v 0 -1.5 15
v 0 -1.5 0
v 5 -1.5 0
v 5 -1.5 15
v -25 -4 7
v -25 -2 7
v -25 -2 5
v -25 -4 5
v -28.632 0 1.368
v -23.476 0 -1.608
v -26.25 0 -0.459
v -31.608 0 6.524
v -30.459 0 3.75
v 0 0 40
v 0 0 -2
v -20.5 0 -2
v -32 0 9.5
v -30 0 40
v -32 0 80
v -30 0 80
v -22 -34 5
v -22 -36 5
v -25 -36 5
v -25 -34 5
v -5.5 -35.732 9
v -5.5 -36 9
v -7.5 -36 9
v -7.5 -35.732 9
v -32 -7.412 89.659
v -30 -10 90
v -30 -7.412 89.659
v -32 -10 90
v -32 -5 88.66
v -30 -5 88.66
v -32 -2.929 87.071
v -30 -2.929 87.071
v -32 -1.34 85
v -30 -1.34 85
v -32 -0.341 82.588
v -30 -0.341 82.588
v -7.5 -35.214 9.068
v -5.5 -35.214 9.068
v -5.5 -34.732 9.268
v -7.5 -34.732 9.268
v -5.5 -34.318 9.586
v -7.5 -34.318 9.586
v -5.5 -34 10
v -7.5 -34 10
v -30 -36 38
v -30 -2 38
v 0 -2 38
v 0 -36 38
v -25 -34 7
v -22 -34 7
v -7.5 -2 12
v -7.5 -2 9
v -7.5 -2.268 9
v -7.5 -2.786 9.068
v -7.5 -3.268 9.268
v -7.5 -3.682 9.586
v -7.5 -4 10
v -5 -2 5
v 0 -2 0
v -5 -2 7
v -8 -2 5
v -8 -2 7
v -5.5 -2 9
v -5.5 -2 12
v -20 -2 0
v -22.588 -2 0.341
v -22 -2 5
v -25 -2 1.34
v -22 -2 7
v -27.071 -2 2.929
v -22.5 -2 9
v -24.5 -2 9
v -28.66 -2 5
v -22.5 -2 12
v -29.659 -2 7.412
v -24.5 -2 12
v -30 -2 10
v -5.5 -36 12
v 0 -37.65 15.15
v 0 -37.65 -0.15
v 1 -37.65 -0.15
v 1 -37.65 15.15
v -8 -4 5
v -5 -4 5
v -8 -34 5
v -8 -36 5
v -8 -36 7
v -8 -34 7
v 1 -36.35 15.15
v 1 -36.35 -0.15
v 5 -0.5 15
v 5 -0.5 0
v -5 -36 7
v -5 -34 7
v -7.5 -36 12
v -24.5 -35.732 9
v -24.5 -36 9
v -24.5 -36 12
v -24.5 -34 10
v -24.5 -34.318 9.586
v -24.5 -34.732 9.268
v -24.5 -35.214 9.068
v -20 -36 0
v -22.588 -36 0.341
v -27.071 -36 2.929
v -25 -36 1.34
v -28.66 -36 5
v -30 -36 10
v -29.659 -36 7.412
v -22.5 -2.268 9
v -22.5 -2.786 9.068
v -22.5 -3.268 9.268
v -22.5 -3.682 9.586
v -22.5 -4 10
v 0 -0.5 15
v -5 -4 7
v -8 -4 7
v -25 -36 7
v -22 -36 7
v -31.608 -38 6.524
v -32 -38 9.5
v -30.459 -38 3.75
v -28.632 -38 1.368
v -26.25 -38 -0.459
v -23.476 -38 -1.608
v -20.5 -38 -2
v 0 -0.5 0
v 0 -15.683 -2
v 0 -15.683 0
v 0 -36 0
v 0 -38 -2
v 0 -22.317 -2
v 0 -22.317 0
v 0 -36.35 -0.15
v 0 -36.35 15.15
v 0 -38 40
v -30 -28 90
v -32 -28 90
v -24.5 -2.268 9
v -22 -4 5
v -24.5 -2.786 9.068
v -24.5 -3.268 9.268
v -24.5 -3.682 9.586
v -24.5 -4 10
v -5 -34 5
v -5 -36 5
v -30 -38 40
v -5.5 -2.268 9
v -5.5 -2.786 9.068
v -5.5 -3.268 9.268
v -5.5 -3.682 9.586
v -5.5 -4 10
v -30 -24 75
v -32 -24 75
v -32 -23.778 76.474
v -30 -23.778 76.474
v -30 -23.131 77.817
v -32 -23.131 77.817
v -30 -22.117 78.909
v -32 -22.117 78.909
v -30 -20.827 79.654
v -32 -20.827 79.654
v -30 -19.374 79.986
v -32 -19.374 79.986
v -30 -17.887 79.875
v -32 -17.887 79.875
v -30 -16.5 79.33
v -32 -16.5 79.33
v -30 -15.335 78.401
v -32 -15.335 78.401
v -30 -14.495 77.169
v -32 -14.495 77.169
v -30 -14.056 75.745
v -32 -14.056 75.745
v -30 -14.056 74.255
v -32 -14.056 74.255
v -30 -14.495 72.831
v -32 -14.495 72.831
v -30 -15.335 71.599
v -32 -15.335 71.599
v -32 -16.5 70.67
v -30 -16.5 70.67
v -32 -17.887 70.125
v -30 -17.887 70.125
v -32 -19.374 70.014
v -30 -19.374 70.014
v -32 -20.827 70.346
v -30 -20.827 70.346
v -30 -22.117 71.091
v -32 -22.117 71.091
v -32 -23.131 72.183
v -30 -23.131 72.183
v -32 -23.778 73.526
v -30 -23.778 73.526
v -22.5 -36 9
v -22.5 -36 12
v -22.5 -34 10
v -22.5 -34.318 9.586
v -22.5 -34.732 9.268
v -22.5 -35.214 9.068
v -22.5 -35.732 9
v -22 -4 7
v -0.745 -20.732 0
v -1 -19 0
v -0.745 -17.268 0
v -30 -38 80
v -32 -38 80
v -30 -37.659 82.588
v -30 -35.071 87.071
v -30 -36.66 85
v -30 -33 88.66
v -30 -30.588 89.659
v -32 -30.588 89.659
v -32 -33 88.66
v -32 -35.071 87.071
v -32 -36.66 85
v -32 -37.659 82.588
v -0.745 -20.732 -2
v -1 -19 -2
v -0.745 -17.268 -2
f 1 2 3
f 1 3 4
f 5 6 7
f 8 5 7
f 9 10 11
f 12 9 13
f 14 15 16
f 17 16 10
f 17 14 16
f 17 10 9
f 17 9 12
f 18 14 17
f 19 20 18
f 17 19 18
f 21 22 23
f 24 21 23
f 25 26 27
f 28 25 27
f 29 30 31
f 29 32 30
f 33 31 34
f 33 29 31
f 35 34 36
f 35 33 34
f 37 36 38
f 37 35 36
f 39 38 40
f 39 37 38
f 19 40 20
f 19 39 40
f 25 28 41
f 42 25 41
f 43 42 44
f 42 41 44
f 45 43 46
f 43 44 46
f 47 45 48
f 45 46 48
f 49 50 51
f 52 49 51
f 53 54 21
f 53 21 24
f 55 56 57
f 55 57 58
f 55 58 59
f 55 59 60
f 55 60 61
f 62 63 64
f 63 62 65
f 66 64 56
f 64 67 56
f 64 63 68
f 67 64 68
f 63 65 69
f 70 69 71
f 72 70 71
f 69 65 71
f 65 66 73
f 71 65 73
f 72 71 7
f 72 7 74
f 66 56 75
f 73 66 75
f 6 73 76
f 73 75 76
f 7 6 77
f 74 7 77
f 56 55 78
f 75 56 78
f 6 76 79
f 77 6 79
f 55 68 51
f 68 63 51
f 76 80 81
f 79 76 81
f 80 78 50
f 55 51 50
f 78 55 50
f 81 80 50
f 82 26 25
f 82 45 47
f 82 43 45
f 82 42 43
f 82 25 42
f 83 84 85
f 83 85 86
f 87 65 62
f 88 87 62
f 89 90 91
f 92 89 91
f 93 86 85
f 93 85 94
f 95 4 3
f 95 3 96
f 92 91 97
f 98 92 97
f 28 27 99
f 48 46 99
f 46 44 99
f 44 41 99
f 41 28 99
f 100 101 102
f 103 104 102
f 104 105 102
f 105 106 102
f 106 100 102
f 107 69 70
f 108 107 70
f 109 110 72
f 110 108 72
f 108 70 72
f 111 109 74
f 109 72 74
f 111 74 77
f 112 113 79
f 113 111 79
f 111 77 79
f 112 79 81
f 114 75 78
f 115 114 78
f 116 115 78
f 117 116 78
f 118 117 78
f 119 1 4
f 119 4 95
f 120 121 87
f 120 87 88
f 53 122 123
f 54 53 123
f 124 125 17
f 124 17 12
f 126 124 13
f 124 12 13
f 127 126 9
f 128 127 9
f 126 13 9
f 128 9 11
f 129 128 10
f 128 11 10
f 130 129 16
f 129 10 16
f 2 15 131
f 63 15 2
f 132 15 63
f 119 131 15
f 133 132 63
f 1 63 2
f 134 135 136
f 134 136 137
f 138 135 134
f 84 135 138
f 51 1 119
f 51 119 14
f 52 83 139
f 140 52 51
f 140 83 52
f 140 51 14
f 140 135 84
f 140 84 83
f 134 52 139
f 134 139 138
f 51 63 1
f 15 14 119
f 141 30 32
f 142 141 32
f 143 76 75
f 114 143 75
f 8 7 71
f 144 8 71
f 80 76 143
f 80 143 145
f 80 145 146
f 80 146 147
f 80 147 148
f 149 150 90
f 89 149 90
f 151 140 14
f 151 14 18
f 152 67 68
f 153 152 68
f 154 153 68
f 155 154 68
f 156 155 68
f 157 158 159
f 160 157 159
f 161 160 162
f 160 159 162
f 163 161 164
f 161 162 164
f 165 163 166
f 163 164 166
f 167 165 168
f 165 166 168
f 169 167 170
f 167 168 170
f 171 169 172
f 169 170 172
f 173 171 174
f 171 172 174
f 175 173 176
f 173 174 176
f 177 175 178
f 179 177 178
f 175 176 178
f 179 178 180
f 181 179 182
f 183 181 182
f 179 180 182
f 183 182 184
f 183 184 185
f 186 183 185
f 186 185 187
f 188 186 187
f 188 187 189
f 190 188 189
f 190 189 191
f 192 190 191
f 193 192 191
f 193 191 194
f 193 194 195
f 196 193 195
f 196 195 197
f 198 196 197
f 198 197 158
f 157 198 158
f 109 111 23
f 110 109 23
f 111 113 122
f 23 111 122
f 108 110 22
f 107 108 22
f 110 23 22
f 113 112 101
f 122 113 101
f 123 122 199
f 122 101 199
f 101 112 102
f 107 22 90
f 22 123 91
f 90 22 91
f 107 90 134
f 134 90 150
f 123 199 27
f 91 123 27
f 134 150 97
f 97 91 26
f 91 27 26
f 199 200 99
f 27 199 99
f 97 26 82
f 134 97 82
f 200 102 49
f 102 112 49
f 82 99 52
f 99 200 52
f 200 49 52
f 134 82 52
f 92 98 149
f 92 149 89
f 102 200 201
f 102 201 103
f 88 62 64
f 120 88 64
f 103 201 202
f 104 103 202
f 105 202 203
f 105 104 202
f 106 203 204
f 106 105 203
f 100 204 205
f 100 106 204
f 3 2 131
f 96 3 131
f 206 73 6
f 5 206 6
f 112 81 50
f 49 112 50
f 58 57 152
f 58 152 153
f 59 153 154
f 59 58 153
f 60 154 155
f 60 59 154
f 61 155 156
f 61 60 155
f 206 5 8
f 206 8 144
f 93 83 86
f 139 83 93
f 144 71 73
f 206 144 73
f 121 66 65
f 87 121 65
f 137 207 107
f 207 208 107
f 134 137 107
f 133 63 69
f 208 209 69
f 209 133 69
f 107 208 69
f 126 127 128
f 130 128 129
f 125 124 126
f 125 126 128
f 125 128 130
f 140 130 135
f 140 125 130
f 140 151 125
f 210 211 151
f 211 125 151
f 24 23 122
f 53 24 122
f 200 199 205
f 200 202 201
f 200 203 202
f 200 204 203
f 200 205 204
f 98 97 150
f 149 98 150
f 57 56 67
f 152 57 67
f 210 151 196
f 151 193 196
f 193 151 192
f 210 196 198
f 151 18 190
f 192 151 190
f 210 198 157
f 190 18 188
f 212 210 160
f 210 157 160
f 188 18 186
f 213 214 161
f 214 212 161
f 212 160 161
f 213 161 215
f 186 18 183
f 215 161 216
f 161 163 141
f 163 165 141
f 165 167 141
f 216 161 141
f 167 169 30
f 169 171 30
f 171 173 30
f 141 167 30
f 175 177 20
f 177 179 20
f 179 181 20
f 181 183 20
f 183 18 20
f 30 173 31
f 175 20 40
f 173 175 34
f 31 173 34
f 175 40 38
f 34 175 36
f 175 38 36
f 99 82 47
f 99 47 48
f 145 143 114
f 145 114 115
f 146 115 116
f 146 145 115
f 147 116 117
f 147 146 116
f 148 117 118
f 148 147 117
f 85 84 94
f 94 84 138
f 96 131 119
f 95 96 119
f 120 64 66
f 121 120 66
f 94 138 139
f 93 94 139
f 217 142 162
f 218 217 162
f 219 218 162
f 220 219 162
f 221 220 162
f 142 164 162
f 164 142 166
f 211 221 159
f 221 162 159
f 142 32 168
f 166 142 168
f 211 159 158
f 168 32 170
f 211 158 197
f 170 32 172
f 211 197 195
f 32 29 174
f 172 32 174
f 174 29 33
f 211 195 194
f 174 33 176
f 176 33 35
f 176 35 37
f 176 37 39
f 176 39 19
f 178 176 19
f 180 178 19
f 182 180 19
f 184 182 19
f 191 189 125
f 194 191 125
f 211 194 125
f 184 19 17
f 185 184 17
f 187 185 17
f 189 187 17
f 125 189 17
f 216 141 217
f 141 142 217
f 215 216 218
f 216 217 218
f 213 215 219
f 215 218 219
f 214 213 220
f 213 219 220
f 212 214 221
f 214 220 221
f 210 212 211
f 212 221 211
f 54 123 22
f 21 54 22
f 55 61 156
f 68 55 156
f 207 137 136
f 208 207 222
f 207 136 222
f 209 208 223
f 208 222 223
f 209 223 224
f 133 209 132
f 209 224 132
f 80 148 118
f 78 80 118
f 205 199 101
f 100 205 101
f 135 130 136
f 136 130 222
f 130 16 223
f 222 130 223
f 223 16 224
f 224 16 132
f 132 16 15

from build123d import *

# Parameters (mm, degrees)
F1_DEPTH     = 38
F3_D         = 12
F4_R         = 10
F6_D         = 10
F8_DEPTH     = 2
F10_DEPTH    = 2
F11_W        = 30
F11_H        = 38
F12_DEPTH    = 2
F14_W        = 1
F14_H        = 15
F15_DEPTH    = 5
F16_W        = 2
F16_H        = 3
F18_DEPTH    = 2
F17_W        = 2
F17_H        = 3
F19_DEPTH    = 2
F20_SIZE     = 1.99999
F21_T1_DEPTH = 10.6602829052
F21_T3_DEPTH = 10.6602829052
F14_W_2      = 1.3
F14_H_2      = 15.3
F22_DEPTH    = 1


# Not quite as in the source:
# - a fillet or chamfer that OpenCascade refuses, or shapes differently, is made with other operations: its cross-section is extruded or revolved along the edge and cut away or added
# - a fillet or chamfer is up to 0.001 mm smaller than in the source, because OpenCascade refuses the exact size
# - a feature names something its author has since deleted; it is built from what else it names


with BuildPart() as f1:
    # F0 (on Front) → F1 (new body)
    with BuildSketch(Plane.XZ):
        with BuildLine():
            Line((-30, 90), (-32, 90))
            Line((-32, 90), (-32, 9.5))
            ThreePointArc((-32, 9.5), (-28.6317279836, 1.3682720164), (-20.5, -2))
            Line((-20.5, -2), (0, -2))
            Line((0, -2), (0, 0))
            Line((0, 0), (-20, 0))
            ThreePointArc((-20, 0), (-27.0710678119, 2.9289321881), (-30, 10))
            Line((-30, 10), (-30, 90))
        make_face()
    extrude(amount=F1_DEPTH)

    # F3 (through all)
    with Locations(Plane.XY):
        with Locations((5, -19)):
            Hole(F3_D / 2)

    # F4
    f4_edges = [f1.edges().sort_by_distance(p)[0] for p in [
        (-31, -38, 90),
        (-31, 0, 90),
    ]]
    fillet(f4_edges, radius=F4_R)

    # F6 (through all)
    with Locations(Plane.YZ.offset(-30)):
        with Locations((-19, 75)):
            Hole(F6_D / 2)

    # F7 (on face) → F8 (join)
    with BuildSketch(Plane.XZ.offset(38)):
        with BuildLine():
            Line((-20, 0), (0, 0))
            Line((0, 0), (0, 40))
            Line((0, 40), (-30, 40))
            Line((-30, 40), (-30, 10))
            ThreePointArc((-30, 10), (-27.0710678119, 2.9289321881), (-20, 0))
        make_face()
    extrude(amount=-F8_DEPTH)

    # F9 (on face) → F10 (join)
    with BuildSketch(Plane(origin=(0, 0, 0), x_dir=(-1, 0, 0), z_dir=(0, 1, 0))):
        with BuildLine():
            Line((0, 40), (0, 0))
            Line((0, 0), (20, 0))
            ThreePointArc((20, 0), (27.0710678119, 2.9289321881), (30, 10))
            Line((30, 10), (30, 40))
            Line((30, 40), (0, 40))
        make_face()
    extrude(amount=-F10_DEPTH)

    # F11 (on face) → F12 (join)
    with BuildSketch(Plane.XY.offset(40)):
        with Locations((-15, -19)):
            Rectangle(F11_W, F11_H)
    extrude(amount=-F12_DEPTH)

    # F13: union 

    # F14 (on face) → F15 (join)
    with BuildSketch(Plane.YZ):
        with Locations((-1, 7.5)):
            Rectangle(F14_W, F14_H)
    extrude(amount=F15_DEPTH)

    # F16 (on face) → F18 (join)
    with BuildSketch(Plane.XZ.offset(2)):
        with Locations((-6.5, 10.5)):
            Rectangle(F16_W, F16_H)
        Polygon((-5, 5), (-5, 6), (-5, 7), (-8, 7), (-8, 5), align=None)
        with Locations((-23.5, 10.5)):
            Rectangle(F16_W, F16_H)
        Polygon((-25, 7), (-25, 6), (-25, 5), (-22, 5), (-22, 7), align=None)
    extrude(amount=F18_DEPTH)

    # F17 (on face) → F19 (join)
    with BuildSketch(Plane(origin=(0, -36, 0), x_dir=(-1, 0, 0), z_dir=(0, 1, 0))):
        with Locations((6.5, 10.5)):
            Rectangle(F17_W, F17_H)
        Polygon((5, 7), (5, 6), (5, 5), (8, 5), (8, 7), align=None)
        Polygon((25, 5), (25, 6), (25, 7), (22, 7), (22, 5), align=None)
        with Locations((23.5, 10.5)):
            Rectangle(F17_W, F17_H)
    extrude(amount=F19_DEPTH)

    # F20 (size 2 in the source; OpenCascade refuses exactly that, so slightly less here)
    f20_edges = [f1.edges().sort_by_distance(p)[0] for p in [
        (-6.5, -34, 12),
        (-23.5, -34, 12),
        (-6.5, -4, 12),
        (-23.5, -4, 12),
    ]]
    chamfer(f20_edges, length=F20_SIZE)

    # F21: fillet of radius 2 on 4 edges, made by hand

    # F21_s2 → F21_t1 (cut)
    with BuildSketch(Plane.YZ.offset(-11.8301414526)):
        with BuildLine():
            ThreePointArc((-35.732056581, 9), (-34.732051581, 9.2679520792), (-34, 10.00001))
            Line((-34, 10.00001), (-34, 9))
            Line((-34, 9), (-35.732056581, 9))
        make_face()
        with BuildLine():
            ThreePointArc((-2.267943419, 9), (-3.267948419, 9.2679520792), (-4, 10.00001))
            Line((-4, 10.00001), (-4, 9))
            Line((-4, 9), (-2.267943419, 9))
        make_face()
    extrude(amount=F21_T1_DEPTH, mode=Mode.SUBTRACT)

    # F21_s4 → F21_t3 (cut)
    with BuildSketch(Plane.YZ.offset(-28.8301414526)):
        with BuildLine():
            ThreePointArc((-34, 10.00001), (-34.732051581, 9.2679520792), (-35.732056581, 9))
            Line((-35.732056581, 9), (-34, 9))
            Line((-34, 9), (-34, 10.00001))
        make_face()
        with BuildLine():
            ThreePointArc((-2.267943419, 9), (-3.267948419, 9.2679520792), (-4, 10.00001))
            Line((-4, 10.00001), (-4, 9))
            Line((-4, 9), (-2.267943419, 9))
        make_face()
    extrude(amount=F21_T3_DEPTH, mode=Mode.SUBTRACT)

    # F14 (on face) → F22 (join)
    with BuildSketch(Plane.YZ):
        with Locations((-37, 7.5)):
            Rectangle(F14_W_2, F14_H_2)
    extrude(amount=F22_DEPTH)


solid = f1.part
